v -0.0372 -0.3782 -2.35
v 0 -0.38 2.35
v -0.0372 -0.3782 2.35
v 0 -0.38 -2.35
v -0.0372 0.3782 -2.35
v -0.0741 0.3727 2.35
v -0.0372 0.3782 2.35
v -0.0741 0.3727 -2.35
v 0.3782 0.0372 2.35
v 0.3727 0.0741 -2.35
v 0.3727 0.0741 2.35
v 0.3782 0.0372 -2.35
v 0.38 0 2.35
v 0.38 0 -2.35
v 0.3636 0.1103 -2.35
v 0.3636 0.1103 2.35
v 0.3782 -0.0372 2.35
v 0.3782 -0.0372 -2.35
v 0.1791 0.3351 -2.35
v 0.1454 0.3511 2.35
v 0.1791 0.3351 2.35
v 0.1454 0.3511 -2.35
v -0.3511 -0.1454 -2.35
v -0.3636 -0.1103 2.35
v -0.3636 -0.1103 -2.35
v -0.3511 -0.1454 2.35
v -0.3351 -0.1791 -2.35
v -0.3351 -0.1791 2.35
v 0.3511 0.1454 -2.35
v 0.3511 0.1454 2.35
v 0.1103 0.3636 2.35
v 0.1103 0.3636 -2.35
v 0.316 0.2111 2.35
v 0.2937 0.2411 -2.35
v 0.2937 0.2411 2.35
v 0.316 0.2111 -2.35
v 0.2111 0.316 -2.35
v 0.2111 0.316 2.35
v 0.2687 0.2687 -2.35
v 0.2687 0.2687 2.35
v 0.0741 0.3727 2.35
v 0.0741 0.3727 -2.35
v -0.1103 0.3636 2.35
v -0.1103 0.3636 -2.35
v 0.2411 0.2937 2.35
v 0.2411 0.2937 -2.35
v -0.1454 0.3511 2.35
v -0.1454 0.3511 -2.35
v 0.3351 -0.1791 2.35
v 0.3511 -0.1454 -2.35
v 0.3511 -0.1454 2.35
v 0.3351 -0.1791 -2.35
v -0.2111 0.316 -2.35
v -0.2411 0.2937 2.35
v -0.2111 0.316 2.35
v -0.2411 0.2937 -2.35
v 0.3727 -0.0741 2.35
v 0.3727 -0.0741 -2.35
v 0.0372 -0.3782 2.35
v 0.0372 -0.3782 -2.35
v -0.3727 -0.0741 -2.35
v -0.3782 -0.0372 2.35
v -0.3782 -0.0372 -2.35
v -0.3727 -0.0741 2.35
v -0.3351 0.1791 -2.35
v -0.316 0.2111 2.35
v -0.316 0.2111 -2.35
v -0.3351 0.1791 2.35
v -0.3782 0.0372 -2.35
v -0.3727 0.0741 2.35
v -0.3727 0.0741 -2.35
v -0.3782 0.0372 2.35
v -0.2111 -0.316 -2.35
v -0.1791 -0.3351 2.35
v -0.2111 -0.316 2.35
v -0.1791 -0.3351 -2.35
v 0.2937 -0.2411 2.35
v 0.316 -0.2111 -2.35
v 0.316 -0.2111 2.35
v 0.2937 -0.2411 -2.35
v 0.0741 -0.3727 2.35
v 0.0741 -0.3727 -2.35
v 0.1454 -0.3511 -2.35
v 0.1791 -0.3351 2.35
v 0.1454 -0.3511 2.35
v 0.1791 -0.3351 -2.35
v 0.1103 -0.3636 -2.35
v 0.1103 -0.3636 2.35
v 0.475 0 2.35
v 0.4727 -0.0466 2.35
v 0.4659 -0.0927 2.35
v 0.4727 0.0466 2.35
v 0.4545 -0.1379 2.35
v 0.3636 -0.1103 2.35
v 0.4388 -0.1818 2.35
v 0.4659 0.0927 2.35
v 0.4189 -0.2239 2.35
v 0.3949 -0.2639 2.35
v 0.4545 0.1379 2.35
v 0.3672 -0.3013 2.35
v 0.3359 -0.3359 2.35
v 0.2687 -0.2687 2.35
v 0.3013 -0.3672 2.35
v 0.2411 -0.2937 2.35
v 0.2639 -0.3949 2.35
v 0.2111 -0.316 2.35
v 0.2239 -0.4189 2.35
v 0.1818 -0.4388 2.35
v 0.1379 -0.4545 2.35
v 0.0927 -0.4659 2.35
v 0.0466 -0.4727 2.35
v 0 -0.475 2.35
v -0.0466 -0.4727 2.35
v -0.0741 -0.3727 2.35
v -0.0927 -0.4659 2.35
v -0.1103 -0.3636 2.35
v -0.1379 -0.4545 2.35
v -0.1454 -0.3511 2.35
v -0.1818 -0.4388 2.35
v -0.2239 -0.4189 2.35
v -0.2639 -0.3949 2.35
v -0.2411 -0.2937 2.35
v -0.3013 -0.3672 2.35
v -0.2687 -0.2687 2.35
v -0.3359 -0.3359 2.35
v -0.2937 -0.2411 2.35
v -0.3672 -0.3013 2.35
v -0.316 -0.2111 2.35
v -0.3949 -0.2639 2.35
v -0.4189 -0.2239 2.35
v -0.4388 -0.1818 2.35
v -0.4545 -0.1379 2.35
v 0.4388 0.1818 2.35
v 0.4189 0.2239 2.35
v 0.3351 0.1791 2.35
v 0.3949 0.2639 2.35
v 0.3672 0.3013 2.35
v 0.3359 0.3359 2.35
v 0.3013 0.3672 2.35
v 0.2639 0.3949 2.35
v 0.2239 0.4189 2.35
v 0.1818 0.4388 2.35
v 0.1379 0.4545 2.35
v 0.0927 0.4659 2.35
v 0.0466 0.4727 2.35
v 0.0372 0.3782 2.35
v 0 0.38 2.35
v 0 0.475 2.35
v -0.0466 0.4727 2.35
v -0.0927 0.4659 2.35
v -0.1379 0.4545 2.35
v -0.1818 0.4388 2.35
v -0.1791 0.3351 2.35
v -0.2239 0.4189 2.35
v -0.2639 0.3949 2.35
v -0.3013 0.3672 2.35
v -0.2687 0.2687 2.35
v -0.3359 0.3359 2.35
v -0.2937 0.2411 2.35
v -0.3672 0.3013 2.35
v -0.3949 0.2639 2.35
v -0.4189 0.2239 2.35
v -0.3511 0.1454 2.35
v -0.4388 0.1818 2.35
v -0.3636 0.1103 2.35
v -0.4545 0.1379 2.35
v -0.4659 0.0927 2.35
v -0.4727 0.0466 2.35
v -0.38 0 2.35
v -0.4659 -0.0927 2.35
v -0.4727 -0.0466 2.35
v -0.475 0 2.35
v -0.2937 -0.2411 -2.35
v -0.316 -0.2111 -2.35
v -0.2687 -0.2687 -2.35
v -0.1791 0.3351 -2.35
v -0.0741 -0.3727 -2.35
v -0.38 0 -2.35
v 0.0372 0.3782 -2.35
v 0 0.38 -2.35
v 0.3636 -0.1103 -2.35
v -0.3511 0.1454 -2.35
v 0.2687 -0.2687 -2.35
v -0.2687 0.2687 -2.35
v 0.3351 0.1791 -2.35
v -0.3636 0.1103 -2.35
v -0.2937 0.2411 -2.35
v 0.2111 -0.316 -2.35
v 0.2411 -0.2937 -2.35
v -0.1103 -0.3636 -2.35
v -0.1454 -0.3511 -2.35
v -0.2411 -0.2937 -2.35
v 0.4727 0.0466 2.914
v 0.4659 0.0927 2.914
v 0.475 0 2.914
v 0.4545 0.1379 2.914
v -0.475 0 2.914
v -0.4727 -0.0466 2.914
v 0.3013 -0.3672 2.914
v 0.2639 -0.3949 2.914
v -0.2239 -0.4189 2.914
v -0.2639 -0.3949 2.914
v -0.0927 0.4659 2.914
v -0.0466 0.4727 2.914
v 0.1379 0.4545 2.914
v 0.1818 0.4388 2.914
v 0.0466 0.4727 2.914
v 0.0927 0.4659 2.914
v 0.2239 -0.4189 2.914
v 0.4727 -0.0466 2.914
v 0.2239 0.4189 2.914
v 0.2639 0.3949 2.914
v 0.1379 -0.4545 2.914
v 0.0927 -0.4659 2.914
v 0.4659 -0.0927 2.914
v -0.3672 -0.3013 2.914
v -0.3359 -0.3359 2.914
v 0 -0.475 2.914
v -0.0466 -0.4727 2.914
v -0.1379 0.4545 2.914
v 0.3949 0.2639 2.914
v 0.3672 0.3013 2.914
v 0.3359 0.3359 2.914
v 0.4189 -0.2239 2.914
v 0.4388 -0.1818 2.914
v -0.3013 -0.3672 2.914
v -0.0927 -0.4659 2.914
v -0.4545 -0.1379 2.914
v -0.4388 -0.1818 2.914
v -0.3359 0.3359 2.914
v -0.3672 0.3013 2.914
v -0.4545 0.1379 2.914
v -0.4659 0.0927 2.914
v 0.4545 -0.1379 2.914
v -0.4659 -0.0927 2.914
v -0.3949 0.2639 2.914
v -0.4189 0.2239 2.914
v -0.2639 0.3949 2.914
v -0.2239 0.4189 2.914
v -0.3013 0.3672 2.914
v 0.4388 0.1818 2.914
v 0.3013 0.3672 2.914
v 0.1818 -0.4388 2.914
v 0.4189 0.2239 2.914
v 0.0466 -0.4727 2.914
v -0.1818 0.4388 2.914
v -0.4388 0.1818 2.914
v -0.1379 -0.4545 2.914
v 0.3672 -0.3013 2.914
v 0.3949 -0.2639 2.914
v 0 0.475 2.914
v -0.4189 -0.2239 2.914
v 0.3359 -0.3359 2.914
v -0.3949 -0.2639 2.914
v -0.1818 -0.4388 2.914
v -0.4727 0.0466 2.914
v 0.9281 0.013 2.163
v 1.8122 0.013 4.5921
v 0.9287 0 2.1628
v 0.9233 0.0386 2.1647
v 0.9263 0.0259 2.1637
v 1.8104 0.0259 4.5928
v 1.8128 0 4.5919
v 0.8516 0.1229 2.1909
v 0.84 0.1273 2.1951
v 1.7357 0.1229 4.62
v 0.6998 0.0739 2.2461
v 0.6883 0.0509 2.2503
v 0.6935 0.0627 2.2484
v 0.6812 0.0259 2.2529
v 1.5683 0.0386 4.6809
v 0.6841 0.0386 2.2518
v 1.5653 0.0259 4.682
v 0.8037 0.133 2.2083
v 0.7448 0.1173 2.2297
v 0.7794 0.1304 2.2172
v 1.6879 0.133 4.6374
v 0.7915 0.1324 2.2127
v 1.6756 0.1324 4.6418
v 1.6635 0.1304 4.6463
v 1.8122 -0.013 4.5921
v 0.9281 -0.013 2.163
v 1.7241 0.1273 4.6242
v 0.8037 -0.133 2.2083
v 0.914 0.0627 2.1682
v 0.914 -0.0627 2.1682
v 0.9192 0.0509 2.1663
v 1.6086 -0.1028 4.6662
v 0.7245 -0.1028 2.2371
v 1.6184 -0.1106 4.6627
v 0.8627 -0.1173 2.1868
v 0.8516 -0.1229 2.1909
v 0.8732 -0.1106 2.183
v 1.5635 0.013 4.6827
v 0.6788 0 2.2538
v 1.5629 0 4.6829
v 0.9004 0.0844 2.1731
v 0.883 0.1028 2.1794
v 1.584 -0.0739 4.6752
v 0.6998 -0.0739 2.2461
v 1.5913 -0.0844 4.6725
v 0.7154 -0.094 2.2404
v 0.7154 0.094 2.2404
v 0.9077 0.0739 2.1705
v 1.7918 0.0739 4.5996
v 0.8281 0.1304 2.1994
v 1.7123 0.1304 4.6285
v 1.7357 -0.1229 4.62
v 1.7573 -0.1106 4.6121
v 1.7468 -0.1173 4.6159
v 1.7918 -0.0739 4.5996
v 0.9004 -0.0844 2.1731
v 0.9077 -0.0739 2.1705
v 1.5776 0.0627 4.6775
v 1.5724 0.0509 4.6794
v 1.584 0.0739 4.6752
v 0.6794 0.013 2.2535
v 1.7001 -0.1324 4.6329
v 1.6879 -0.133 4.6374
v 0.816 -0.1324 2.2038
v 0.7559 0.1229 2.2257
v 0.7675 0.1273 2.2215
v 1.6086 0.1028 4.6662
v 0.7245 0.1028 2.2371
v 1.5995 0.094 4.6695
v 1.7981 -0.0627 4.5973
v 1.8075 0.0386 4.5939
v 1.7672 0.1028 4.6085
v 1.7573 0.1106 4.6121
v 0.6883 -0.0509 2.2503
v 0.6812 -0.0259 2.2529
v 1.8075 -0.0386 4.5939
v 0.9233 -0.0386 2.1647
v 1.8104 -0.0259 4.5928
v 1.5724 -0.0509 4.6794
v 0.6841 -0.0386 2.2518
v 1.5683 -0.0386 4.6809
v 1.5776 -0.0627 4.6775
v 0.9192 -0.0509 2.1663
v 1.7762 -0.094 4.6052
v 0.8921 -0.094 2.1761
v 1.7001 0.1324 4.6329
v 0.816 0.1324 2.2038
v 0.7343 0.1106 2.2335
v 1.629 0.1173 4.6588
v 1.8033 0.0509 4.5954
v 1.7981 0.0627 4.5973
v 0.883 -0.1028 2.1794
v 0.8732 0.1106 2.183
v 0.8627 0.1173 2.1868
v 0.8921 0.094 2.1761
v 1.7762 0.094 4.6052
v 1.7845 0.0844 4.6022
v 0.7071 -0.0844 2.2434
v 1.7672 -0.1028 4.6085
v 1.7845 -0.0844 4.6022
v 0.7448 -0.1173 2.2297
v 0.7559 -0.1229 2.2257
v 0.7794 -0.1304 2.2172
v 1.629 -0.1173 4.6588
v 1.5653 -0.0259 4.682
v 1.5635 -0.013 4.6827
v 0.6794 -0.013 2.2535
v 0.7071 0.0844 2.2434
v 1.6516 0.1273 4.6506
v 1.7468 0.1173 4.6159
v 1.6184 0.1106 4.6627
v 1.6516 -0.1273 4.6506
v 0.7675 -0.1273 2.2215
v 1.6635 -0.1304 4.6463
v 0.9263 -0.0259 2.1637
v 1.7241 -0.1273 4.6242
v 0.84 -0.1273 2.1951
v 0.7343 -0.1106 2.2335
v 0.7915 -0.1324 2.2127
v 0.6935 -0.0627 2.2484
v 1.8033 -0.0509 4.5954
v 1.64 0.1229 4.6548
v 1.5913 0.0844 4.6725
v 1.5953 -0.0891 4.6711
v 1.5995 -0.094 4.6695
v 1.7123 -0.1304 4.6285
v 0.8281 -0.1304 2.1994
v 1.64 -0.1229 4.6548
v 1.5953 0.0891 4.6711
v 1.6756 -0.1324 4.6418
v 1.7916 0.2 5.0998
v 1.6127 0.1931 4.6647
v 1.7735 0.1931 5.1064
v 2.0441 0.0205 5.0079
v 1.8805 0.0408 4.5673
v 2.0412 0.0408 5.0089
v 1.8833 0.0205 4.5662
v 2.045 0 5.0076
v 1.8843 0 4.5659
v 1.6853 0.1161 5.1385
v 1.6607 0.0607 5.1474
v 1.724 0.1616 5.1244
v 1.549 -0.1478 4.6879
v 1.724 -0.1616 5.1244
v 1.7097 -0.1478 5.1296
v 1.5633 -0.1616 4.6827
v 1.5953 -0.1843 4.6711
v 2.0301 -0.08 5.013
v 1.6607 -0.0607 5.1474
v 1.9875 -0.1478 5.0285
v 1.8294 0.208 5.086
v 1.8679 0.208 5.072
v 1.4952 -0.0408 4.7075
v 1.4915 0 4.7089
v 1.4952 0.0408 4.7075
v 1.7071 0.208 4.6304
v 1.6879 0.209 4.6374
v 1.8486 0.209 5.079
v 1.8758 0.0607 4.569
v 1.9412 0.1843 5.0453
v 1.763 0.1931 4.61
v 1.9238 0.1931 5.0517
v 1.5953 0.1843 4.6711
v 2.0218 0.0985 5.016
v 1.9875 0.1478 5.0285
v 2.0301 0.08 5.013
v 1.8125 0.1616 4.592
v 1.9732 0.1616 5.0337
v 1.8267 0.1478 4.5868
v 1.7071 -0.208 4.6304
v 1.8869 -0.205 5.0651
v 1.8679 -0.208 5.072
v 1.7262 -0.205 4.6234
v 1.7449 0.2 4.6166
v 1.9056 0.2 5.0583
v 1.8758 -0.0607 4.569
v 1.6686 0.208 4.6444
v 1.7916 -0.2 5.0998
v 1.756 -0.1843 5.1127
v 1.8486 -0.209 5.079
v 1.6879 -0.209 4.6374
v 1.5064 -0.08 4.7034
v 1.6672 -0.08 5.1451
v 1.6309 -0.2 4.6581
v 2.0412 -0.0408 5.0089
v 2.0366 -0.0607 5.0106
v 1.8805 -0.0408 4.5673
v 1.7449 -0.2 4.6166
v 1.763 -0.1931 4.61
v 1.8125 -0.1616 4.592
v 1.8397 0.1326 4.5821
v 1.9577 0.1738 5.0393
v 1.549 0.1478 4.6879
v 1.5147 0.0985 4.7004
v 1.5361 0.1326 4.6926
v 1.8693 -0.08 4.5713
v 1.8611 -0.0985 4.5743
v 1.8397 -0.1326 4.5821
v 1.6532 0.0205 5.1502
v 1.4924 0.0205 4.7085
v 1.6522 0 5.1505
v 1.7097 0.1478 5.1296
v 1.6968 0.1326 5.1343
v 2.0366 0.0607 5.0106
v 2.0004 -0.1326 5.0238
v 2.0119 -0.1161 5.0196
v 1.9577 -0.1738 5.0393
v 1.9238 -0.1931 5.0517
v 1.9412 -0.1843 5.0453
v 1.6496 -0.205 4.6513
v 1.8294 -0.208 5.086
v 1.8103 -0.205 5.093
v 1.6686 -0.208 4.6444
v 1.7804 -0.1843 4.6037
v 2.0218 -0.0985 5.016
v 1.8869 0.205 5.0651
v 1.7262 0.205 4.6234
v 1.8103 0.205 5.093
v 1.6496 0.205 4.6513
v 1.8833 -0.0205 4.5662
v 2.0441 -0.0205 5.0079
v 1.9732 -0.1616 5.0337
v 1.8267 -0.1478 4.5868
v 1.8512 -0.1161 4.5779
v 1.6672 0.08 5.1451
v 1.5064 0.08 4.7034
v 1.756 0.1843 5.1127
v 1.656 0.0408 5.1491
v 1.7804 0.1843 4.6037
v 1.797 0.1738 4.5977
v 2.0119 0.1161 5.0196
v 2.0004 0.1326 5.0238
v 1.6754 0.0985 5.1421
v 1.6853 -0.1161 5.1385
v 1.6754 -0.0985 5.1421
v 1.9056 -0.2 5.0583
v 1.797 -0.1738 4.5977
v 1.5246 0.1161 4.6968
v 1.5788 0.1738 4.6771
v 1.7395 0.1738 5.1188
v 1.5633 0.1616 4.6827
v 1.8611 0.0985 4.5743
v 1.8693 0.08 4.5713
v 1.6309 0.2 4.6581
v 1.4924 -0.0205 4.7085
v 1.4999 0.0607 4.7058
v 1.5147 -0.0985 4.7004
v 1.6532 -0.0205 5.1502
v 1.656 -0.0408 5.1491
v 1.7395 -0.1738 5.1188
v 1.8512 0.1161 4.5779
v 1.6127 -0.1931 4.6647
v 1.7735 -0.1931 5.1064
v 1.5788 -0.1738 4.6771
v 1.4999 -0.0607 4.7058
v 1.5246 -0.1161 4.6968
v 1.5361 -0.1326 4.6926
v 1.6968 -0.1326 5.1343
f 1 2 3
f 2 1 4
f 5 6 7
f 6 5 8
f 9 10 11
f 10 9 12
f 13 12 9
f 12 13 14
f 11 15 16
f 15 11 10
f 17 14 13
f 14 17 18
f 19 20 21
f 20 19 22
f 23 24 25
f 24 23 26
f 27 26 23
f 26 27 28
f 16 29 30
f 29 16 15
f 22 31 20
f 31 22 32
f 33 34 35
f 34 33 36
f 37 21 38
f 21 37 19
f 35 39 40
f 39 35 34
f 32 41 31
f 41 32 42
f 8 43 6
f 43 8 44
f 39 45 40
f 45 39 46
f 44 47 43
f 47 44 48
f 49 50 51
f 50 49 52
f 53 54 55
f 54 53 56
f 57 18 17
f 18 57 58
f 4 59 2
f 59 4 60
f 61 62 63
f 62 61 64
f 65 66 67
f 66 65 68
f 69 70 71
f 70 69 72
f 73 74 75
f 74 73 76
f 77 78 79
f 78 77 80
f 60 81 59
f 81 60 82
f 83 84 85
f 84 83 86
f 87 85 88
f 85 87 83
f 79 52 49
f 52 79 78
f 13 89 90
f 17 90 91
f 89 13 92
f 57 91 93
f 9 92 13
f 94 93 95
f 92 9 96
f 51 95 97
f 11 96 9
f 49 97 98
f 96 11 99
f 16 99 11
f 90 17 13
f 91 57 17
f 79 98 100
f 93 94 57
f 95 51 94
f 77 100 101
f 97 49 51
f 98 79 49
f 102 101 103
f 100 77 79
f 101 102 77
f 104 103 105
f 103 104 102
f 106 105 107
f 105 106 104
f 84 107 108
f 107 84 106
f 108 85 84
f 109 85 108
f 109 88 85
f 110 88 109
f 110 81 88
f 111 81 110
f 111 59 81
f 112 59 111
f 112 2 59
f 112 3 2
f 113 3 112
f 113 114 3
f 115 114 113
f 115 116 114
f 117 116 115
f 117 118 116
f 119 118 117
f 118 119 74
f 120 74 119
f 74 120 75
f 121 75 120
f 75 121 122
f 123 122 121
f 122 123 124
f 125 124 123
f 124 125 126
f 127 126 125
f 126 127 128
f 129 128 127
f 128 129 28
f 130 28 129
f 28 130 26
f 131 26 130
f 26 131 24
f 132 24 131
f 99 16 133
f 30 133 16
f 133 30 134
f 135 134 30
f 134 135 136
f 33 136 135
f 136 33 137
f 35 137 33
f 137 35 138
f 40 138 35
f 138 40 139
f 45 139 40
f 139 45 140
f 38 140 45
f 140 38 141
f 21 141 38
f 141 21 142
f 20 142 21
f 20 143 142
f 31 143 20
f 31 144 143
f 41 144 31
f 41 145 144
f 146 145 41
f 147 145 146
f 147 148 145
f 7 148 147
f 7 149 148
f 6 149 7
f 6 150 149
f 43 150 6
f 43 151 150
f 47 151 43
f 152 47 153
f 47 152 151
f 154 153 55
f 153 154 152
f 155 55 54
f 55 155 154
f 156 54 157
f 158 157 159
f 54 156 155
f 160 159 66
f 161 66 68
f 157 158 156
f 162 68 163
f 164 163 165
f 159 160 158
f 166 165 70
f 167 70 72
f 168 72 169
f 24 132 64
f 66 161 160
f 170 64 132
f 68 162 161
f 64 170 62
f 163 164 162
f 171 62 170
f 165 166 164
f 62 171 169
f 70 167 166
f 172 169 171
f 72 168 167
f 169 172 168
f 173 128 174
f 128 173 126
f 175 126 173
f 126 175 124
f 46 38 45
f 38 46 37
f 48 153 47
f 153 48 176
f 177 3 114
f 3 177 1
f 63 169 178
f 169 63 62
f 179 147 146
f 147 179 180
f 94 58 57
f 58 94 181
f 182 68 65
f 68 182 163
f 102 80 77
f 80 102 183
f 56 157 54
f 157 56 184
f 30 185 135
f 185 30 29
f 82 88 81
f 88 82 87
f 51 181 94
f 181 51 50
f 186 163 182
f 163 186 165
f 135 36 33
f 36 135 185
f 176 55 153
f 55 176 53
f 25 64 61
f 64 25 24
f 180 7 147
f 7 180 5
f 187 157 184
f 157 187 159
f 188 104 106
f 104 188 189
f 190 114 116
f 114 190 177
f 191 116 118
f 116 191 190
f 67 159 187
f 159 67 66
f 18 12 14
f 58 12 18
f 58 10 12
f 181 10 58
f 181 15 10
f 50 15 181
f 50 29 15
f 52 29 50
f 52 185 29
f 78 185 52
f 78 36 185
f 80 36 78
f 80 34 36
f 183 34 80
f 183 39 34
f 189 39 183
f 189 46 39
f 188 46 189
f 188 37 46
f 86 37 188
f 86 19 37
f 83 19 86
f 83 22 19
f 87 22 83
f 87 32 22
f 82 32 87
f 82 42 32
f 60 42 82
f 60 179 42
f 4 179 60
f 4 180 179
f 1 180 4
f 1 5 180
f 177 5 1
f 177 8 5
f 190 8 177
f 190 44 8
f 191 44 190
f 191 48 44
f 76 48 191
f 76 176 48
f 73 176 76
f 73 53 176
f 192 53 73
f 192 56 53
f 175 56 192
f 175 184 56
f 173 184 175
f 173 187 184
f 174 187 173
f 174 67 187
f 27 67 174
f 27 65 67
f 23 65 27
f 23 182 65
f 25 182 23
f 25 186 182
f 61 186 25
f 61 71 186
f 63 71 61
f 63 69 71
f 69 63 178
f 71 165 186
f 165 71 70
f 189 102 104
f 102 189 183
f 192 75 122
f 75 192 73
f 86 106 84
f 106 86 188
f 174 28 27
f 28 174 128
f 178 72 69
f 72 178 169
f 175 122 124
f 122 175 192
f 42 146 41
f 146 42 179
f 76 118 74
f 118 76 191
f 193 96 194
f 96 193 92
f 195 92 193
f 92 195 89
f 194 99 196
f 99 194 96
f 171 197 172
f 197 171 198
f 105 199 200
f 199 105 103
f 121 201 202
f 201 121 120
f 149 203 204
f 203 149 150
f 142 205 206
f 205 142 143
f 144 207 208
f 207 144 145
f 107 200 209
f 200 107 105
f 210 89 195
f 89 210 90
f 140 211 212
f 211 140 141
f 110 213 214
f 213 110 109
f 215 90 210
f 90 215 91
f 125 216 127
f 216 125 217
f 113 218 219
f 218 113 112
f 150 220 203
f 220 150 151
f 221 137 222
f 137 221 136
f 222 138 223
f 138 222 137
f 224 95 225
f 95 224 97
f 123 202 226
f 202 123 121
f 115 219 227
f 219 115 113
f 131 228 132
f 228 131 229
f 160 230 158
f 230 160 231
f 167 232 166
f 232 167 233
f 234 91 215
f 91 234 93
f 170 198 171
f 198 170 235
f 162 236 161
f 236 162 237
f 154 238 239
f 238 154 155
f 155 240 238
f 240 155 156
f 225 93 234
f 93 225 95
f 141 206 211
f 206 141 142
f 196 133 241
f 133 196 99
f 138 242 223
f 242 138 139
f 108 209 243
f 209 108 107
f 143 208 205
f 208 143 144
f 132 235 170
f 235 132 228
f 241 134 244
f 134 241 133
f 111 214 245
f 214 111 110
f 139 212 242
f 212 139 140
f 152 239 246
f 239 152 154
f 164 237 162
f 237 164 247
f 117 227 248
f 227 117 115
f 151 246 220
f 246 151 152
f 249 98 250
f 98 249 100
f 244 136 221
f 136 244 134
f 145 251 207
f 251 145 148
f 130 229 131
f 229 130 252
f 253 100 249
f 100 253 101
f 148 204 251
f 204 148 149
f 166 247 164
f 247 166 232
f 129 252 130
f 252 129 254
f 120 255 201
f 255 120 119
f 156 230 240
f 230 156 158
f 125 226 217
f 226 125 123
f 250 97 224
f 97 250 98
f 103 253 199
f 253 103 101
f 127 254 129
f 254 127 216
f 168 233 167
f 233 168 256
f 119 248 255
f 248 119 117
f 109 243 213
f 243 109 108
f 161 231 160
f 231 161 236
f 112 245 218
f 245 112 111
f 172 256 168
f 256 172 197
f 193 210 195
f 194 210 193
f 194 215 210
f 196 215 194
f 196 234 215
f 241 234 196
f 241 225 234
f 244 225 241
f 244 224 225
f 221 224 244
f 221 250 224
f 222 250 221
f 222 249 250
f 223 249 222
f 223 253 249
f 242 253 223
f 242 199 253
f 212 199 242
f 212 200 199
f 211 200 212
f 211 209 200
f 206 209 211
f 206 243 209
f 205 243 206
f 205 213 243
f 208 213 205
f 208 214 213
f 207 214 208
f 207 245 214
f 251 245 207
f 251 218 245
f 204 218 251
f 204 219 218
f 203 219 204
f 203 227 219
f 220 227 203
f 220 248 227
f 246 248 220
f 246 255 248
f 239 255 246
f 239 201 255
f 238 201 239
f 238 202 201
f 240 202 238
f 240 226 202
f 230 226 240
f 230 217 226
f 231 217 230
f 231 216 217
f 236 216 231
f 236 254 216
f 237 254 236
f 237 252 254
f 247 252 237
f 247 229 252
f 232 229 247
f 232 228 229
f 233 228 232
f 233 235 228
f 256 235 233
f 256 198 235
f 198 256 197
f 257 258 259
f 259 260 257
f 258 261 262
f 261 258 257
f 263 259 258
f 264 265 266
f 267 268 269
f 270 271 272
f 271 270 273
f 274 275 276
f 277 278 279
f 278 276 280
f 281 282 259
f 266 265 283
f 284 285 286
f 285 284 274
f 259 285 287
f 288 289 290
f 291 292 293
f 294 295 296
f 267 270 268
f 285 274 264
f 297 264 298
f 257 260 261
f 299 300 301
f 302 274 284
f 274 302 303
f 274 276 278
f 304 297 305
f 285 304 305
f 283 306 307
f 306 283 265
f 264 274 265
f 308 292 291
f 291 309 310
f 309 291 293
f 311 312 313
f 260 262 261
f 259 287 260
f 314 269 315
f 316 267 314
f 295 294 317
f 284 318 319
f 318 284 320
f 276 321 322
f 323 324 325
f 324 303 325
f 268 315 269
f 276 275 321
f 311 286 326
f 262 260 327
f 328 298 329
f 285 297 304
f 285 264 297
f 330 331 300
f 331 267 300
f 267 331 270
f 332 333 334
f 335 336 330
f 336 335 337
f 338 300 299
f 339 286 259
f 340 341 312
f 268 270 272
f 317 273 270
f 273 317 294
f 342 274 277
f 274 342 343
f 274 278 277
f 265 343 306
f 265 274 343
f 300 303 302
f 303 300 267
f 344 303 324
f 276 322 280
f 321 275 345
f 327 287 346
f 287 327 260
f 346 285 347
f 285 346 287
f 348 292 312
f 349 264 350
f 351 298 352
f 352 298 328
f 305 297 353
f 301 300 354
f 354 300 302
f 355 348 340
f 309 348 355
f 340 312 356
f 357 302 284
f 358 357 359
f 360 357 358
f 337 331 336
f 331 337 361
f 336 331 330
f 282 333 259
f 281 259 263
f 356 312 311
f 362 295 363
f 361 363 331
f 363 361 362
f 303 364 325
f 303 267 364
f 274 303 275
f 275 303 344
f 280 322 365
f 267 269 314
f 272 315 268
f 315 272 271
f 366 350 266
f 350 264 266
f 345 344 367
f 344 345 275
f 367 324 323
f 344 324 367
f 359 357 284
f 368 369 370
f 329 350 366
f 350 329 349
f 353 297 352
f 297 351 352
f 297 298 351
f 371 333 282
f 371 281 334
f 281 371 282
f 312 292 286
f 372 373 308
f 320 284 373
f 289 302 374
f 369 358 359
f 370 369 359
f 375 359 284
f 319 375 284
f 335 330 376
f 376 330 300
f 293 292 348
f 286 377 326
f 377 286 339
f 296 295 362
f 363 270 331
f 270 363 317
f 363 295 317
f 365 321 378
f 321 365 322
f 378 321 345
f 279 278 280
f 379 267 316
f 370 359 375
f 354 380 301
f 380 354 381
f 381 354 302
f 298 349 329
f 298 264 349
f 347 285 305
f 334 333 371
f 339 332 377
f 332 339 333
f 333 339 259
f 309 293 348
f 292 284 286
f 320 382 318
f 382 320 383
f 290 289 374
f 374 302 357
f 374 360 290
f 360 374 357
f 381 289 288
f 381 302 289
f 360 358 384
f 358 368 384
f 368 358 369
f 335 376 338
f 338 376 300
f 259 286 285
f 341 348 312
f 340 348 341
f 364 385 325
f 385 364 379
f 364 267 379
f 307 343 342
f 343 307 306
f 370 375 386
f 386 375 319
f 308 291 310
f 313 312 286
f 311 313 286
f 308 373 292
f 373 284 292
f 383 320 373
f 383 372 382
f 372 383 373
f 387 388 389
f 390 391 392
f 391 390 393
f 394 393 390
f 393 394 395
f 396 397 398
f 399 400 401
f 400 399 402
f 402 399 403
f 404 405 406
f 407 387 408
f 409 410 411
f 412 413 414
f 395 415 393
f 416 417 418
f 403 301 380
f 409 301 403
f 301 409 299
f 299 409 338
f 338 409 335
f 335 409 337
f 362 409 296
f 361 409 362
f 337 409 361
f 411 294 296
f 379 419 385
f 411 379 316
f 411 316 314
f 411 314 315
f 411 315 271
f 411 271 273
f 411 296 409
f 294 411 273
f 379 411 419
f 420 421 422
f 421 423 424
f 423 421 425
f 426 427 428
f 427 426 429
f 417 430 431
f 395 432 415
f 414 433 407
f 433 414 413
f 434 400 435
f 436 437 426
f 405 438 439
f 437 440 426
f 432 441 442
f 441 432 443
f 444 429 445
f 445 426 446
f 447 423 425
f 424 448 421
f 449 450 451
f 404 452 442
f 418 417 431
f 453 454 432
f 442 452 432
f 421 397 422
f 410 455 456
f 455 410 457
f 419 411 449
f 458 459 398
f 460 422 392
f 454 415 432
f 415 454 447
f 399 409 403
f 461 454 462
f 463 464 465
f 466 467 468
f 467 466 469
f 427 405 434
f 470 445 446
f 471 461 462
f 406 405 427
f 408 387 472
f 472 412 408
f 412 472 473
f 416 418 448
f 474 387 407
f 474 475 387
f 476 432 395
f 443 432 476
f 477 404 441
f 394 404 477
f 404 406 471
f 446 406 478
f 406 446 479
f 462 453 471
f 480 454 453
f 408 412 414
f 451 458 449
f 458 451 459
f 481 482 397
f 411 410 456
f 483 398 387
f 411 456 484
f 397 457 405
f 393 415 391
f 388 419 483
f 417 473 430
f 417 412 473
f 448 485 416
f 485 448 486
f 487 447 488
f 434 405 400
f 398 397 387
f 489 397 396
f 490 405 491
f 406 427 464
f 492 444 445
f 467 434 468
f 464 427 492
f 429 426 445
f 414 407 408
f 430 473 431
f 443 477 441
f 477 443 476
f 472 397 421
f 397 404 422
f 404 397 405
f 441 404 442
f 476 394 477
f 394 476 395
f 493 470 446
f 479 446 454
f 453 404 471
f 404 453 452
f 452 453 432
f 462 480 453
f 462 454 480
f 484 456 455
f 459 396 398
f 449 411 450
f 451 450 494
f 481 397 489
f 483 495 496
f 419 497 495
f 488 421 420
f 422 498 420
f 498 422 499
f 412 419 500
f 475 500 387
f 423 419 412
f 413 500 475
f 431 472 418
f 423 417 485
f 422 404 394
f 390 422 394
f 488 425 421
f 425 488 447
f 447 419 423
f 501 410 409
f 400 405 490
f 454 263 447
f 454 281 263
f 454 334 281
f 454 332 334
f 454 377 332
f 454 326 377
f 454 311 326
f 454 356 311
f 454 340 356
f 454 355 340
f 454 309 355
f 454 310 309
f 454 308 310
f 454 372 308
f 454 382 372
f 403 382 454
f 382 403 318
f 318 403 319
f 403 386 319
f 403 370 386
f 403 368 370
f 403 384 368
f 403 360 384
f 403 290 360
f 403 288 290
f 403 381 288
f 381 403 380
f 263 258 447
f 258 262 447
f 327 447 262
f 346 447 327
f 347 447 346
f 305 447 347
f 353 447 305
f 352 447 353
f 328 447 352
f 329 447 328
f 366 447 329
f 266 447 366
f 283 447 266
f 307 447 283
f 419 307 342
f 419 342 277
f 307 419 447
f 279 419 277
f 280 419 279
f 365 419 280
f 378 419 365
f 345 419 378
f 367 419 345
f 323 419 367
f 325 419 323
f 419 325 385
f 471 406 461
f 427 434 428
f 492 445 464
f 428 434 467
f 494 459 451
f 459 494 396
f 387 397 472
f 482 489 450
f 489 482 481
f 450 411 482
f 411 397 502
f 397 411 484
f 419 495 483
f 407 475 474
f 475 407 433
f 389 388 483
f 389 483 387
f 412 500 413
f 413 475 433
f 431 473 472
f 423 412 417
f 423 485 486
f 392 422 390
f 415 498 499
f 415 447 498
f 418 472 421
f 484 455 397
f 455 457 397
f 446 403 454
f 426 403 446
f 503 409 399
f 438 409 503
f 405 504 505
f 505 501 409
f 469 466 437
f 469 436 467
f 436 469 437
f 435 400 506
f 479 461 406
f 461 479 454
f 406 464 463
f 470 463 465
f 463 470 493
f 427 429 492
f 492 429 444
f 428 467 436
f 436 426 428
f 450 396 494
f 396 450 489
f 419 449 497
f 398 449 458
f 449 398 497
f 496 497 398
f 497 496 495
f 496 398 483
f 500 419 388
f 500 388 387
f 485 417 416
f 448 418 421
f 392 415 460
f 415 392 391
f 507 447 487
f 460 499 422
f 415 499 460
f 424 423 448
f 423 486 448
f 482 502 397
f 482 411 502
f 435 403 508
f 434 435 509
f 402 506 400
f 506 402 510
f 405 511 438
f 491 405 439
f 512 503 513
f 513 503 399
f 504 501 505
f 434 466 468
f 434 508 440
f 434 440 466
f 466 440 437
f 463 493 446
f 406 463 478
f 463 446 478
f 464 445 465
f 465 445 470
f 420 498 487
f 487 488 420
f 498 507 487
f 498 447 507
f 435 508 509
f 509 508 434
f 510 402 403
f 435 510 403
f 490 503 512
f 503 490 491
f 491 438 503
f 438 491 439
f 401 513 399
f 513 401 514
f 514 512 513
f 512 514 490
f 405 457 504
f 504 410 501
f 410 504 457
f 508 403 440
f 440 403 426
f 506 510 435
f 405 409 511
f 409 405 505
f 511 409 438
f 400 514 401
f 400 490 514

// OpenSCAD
$fn=64;

body_d = 0.76;
body_r = body_d/2;
body_h = 4.7;

module toggle_switch(body_d=0.76, body_h=4.7) {
    body_r = body_d/2;

    lever_d = body_d*0.35;
    lever_h = body_h*0.55;
    lever_r = lever_d/2;

    cap_d = body_d*0.55;
    cap_h = body_h*0.10;
    cap_r = cap_d/2;

    base_d = body_d*1.25;
    base_h = body_h*0.12;
    base_r = base_d/2;

    union() {
        cylinder(h=body_h, r=body_r, center=true);

        translate([0,0, body_h/2 + base_h/2])
            cylinder(h=base_h, r=base_r, center=true);

        rotate([0,20,0])
            translate([0,0, body_h/2 + lever_h/2])
                cylinder(h=lever_h, r=lever_r, center=true);

        rotate([0,20,0])
            translate([0,0, body_h/2 + lever_h + cap_h/2])
                cylinder(h=cap_h, r=cap_r, center=true);
    }
}

toggle_switch(body_d=body_d, body_h=body_h);
